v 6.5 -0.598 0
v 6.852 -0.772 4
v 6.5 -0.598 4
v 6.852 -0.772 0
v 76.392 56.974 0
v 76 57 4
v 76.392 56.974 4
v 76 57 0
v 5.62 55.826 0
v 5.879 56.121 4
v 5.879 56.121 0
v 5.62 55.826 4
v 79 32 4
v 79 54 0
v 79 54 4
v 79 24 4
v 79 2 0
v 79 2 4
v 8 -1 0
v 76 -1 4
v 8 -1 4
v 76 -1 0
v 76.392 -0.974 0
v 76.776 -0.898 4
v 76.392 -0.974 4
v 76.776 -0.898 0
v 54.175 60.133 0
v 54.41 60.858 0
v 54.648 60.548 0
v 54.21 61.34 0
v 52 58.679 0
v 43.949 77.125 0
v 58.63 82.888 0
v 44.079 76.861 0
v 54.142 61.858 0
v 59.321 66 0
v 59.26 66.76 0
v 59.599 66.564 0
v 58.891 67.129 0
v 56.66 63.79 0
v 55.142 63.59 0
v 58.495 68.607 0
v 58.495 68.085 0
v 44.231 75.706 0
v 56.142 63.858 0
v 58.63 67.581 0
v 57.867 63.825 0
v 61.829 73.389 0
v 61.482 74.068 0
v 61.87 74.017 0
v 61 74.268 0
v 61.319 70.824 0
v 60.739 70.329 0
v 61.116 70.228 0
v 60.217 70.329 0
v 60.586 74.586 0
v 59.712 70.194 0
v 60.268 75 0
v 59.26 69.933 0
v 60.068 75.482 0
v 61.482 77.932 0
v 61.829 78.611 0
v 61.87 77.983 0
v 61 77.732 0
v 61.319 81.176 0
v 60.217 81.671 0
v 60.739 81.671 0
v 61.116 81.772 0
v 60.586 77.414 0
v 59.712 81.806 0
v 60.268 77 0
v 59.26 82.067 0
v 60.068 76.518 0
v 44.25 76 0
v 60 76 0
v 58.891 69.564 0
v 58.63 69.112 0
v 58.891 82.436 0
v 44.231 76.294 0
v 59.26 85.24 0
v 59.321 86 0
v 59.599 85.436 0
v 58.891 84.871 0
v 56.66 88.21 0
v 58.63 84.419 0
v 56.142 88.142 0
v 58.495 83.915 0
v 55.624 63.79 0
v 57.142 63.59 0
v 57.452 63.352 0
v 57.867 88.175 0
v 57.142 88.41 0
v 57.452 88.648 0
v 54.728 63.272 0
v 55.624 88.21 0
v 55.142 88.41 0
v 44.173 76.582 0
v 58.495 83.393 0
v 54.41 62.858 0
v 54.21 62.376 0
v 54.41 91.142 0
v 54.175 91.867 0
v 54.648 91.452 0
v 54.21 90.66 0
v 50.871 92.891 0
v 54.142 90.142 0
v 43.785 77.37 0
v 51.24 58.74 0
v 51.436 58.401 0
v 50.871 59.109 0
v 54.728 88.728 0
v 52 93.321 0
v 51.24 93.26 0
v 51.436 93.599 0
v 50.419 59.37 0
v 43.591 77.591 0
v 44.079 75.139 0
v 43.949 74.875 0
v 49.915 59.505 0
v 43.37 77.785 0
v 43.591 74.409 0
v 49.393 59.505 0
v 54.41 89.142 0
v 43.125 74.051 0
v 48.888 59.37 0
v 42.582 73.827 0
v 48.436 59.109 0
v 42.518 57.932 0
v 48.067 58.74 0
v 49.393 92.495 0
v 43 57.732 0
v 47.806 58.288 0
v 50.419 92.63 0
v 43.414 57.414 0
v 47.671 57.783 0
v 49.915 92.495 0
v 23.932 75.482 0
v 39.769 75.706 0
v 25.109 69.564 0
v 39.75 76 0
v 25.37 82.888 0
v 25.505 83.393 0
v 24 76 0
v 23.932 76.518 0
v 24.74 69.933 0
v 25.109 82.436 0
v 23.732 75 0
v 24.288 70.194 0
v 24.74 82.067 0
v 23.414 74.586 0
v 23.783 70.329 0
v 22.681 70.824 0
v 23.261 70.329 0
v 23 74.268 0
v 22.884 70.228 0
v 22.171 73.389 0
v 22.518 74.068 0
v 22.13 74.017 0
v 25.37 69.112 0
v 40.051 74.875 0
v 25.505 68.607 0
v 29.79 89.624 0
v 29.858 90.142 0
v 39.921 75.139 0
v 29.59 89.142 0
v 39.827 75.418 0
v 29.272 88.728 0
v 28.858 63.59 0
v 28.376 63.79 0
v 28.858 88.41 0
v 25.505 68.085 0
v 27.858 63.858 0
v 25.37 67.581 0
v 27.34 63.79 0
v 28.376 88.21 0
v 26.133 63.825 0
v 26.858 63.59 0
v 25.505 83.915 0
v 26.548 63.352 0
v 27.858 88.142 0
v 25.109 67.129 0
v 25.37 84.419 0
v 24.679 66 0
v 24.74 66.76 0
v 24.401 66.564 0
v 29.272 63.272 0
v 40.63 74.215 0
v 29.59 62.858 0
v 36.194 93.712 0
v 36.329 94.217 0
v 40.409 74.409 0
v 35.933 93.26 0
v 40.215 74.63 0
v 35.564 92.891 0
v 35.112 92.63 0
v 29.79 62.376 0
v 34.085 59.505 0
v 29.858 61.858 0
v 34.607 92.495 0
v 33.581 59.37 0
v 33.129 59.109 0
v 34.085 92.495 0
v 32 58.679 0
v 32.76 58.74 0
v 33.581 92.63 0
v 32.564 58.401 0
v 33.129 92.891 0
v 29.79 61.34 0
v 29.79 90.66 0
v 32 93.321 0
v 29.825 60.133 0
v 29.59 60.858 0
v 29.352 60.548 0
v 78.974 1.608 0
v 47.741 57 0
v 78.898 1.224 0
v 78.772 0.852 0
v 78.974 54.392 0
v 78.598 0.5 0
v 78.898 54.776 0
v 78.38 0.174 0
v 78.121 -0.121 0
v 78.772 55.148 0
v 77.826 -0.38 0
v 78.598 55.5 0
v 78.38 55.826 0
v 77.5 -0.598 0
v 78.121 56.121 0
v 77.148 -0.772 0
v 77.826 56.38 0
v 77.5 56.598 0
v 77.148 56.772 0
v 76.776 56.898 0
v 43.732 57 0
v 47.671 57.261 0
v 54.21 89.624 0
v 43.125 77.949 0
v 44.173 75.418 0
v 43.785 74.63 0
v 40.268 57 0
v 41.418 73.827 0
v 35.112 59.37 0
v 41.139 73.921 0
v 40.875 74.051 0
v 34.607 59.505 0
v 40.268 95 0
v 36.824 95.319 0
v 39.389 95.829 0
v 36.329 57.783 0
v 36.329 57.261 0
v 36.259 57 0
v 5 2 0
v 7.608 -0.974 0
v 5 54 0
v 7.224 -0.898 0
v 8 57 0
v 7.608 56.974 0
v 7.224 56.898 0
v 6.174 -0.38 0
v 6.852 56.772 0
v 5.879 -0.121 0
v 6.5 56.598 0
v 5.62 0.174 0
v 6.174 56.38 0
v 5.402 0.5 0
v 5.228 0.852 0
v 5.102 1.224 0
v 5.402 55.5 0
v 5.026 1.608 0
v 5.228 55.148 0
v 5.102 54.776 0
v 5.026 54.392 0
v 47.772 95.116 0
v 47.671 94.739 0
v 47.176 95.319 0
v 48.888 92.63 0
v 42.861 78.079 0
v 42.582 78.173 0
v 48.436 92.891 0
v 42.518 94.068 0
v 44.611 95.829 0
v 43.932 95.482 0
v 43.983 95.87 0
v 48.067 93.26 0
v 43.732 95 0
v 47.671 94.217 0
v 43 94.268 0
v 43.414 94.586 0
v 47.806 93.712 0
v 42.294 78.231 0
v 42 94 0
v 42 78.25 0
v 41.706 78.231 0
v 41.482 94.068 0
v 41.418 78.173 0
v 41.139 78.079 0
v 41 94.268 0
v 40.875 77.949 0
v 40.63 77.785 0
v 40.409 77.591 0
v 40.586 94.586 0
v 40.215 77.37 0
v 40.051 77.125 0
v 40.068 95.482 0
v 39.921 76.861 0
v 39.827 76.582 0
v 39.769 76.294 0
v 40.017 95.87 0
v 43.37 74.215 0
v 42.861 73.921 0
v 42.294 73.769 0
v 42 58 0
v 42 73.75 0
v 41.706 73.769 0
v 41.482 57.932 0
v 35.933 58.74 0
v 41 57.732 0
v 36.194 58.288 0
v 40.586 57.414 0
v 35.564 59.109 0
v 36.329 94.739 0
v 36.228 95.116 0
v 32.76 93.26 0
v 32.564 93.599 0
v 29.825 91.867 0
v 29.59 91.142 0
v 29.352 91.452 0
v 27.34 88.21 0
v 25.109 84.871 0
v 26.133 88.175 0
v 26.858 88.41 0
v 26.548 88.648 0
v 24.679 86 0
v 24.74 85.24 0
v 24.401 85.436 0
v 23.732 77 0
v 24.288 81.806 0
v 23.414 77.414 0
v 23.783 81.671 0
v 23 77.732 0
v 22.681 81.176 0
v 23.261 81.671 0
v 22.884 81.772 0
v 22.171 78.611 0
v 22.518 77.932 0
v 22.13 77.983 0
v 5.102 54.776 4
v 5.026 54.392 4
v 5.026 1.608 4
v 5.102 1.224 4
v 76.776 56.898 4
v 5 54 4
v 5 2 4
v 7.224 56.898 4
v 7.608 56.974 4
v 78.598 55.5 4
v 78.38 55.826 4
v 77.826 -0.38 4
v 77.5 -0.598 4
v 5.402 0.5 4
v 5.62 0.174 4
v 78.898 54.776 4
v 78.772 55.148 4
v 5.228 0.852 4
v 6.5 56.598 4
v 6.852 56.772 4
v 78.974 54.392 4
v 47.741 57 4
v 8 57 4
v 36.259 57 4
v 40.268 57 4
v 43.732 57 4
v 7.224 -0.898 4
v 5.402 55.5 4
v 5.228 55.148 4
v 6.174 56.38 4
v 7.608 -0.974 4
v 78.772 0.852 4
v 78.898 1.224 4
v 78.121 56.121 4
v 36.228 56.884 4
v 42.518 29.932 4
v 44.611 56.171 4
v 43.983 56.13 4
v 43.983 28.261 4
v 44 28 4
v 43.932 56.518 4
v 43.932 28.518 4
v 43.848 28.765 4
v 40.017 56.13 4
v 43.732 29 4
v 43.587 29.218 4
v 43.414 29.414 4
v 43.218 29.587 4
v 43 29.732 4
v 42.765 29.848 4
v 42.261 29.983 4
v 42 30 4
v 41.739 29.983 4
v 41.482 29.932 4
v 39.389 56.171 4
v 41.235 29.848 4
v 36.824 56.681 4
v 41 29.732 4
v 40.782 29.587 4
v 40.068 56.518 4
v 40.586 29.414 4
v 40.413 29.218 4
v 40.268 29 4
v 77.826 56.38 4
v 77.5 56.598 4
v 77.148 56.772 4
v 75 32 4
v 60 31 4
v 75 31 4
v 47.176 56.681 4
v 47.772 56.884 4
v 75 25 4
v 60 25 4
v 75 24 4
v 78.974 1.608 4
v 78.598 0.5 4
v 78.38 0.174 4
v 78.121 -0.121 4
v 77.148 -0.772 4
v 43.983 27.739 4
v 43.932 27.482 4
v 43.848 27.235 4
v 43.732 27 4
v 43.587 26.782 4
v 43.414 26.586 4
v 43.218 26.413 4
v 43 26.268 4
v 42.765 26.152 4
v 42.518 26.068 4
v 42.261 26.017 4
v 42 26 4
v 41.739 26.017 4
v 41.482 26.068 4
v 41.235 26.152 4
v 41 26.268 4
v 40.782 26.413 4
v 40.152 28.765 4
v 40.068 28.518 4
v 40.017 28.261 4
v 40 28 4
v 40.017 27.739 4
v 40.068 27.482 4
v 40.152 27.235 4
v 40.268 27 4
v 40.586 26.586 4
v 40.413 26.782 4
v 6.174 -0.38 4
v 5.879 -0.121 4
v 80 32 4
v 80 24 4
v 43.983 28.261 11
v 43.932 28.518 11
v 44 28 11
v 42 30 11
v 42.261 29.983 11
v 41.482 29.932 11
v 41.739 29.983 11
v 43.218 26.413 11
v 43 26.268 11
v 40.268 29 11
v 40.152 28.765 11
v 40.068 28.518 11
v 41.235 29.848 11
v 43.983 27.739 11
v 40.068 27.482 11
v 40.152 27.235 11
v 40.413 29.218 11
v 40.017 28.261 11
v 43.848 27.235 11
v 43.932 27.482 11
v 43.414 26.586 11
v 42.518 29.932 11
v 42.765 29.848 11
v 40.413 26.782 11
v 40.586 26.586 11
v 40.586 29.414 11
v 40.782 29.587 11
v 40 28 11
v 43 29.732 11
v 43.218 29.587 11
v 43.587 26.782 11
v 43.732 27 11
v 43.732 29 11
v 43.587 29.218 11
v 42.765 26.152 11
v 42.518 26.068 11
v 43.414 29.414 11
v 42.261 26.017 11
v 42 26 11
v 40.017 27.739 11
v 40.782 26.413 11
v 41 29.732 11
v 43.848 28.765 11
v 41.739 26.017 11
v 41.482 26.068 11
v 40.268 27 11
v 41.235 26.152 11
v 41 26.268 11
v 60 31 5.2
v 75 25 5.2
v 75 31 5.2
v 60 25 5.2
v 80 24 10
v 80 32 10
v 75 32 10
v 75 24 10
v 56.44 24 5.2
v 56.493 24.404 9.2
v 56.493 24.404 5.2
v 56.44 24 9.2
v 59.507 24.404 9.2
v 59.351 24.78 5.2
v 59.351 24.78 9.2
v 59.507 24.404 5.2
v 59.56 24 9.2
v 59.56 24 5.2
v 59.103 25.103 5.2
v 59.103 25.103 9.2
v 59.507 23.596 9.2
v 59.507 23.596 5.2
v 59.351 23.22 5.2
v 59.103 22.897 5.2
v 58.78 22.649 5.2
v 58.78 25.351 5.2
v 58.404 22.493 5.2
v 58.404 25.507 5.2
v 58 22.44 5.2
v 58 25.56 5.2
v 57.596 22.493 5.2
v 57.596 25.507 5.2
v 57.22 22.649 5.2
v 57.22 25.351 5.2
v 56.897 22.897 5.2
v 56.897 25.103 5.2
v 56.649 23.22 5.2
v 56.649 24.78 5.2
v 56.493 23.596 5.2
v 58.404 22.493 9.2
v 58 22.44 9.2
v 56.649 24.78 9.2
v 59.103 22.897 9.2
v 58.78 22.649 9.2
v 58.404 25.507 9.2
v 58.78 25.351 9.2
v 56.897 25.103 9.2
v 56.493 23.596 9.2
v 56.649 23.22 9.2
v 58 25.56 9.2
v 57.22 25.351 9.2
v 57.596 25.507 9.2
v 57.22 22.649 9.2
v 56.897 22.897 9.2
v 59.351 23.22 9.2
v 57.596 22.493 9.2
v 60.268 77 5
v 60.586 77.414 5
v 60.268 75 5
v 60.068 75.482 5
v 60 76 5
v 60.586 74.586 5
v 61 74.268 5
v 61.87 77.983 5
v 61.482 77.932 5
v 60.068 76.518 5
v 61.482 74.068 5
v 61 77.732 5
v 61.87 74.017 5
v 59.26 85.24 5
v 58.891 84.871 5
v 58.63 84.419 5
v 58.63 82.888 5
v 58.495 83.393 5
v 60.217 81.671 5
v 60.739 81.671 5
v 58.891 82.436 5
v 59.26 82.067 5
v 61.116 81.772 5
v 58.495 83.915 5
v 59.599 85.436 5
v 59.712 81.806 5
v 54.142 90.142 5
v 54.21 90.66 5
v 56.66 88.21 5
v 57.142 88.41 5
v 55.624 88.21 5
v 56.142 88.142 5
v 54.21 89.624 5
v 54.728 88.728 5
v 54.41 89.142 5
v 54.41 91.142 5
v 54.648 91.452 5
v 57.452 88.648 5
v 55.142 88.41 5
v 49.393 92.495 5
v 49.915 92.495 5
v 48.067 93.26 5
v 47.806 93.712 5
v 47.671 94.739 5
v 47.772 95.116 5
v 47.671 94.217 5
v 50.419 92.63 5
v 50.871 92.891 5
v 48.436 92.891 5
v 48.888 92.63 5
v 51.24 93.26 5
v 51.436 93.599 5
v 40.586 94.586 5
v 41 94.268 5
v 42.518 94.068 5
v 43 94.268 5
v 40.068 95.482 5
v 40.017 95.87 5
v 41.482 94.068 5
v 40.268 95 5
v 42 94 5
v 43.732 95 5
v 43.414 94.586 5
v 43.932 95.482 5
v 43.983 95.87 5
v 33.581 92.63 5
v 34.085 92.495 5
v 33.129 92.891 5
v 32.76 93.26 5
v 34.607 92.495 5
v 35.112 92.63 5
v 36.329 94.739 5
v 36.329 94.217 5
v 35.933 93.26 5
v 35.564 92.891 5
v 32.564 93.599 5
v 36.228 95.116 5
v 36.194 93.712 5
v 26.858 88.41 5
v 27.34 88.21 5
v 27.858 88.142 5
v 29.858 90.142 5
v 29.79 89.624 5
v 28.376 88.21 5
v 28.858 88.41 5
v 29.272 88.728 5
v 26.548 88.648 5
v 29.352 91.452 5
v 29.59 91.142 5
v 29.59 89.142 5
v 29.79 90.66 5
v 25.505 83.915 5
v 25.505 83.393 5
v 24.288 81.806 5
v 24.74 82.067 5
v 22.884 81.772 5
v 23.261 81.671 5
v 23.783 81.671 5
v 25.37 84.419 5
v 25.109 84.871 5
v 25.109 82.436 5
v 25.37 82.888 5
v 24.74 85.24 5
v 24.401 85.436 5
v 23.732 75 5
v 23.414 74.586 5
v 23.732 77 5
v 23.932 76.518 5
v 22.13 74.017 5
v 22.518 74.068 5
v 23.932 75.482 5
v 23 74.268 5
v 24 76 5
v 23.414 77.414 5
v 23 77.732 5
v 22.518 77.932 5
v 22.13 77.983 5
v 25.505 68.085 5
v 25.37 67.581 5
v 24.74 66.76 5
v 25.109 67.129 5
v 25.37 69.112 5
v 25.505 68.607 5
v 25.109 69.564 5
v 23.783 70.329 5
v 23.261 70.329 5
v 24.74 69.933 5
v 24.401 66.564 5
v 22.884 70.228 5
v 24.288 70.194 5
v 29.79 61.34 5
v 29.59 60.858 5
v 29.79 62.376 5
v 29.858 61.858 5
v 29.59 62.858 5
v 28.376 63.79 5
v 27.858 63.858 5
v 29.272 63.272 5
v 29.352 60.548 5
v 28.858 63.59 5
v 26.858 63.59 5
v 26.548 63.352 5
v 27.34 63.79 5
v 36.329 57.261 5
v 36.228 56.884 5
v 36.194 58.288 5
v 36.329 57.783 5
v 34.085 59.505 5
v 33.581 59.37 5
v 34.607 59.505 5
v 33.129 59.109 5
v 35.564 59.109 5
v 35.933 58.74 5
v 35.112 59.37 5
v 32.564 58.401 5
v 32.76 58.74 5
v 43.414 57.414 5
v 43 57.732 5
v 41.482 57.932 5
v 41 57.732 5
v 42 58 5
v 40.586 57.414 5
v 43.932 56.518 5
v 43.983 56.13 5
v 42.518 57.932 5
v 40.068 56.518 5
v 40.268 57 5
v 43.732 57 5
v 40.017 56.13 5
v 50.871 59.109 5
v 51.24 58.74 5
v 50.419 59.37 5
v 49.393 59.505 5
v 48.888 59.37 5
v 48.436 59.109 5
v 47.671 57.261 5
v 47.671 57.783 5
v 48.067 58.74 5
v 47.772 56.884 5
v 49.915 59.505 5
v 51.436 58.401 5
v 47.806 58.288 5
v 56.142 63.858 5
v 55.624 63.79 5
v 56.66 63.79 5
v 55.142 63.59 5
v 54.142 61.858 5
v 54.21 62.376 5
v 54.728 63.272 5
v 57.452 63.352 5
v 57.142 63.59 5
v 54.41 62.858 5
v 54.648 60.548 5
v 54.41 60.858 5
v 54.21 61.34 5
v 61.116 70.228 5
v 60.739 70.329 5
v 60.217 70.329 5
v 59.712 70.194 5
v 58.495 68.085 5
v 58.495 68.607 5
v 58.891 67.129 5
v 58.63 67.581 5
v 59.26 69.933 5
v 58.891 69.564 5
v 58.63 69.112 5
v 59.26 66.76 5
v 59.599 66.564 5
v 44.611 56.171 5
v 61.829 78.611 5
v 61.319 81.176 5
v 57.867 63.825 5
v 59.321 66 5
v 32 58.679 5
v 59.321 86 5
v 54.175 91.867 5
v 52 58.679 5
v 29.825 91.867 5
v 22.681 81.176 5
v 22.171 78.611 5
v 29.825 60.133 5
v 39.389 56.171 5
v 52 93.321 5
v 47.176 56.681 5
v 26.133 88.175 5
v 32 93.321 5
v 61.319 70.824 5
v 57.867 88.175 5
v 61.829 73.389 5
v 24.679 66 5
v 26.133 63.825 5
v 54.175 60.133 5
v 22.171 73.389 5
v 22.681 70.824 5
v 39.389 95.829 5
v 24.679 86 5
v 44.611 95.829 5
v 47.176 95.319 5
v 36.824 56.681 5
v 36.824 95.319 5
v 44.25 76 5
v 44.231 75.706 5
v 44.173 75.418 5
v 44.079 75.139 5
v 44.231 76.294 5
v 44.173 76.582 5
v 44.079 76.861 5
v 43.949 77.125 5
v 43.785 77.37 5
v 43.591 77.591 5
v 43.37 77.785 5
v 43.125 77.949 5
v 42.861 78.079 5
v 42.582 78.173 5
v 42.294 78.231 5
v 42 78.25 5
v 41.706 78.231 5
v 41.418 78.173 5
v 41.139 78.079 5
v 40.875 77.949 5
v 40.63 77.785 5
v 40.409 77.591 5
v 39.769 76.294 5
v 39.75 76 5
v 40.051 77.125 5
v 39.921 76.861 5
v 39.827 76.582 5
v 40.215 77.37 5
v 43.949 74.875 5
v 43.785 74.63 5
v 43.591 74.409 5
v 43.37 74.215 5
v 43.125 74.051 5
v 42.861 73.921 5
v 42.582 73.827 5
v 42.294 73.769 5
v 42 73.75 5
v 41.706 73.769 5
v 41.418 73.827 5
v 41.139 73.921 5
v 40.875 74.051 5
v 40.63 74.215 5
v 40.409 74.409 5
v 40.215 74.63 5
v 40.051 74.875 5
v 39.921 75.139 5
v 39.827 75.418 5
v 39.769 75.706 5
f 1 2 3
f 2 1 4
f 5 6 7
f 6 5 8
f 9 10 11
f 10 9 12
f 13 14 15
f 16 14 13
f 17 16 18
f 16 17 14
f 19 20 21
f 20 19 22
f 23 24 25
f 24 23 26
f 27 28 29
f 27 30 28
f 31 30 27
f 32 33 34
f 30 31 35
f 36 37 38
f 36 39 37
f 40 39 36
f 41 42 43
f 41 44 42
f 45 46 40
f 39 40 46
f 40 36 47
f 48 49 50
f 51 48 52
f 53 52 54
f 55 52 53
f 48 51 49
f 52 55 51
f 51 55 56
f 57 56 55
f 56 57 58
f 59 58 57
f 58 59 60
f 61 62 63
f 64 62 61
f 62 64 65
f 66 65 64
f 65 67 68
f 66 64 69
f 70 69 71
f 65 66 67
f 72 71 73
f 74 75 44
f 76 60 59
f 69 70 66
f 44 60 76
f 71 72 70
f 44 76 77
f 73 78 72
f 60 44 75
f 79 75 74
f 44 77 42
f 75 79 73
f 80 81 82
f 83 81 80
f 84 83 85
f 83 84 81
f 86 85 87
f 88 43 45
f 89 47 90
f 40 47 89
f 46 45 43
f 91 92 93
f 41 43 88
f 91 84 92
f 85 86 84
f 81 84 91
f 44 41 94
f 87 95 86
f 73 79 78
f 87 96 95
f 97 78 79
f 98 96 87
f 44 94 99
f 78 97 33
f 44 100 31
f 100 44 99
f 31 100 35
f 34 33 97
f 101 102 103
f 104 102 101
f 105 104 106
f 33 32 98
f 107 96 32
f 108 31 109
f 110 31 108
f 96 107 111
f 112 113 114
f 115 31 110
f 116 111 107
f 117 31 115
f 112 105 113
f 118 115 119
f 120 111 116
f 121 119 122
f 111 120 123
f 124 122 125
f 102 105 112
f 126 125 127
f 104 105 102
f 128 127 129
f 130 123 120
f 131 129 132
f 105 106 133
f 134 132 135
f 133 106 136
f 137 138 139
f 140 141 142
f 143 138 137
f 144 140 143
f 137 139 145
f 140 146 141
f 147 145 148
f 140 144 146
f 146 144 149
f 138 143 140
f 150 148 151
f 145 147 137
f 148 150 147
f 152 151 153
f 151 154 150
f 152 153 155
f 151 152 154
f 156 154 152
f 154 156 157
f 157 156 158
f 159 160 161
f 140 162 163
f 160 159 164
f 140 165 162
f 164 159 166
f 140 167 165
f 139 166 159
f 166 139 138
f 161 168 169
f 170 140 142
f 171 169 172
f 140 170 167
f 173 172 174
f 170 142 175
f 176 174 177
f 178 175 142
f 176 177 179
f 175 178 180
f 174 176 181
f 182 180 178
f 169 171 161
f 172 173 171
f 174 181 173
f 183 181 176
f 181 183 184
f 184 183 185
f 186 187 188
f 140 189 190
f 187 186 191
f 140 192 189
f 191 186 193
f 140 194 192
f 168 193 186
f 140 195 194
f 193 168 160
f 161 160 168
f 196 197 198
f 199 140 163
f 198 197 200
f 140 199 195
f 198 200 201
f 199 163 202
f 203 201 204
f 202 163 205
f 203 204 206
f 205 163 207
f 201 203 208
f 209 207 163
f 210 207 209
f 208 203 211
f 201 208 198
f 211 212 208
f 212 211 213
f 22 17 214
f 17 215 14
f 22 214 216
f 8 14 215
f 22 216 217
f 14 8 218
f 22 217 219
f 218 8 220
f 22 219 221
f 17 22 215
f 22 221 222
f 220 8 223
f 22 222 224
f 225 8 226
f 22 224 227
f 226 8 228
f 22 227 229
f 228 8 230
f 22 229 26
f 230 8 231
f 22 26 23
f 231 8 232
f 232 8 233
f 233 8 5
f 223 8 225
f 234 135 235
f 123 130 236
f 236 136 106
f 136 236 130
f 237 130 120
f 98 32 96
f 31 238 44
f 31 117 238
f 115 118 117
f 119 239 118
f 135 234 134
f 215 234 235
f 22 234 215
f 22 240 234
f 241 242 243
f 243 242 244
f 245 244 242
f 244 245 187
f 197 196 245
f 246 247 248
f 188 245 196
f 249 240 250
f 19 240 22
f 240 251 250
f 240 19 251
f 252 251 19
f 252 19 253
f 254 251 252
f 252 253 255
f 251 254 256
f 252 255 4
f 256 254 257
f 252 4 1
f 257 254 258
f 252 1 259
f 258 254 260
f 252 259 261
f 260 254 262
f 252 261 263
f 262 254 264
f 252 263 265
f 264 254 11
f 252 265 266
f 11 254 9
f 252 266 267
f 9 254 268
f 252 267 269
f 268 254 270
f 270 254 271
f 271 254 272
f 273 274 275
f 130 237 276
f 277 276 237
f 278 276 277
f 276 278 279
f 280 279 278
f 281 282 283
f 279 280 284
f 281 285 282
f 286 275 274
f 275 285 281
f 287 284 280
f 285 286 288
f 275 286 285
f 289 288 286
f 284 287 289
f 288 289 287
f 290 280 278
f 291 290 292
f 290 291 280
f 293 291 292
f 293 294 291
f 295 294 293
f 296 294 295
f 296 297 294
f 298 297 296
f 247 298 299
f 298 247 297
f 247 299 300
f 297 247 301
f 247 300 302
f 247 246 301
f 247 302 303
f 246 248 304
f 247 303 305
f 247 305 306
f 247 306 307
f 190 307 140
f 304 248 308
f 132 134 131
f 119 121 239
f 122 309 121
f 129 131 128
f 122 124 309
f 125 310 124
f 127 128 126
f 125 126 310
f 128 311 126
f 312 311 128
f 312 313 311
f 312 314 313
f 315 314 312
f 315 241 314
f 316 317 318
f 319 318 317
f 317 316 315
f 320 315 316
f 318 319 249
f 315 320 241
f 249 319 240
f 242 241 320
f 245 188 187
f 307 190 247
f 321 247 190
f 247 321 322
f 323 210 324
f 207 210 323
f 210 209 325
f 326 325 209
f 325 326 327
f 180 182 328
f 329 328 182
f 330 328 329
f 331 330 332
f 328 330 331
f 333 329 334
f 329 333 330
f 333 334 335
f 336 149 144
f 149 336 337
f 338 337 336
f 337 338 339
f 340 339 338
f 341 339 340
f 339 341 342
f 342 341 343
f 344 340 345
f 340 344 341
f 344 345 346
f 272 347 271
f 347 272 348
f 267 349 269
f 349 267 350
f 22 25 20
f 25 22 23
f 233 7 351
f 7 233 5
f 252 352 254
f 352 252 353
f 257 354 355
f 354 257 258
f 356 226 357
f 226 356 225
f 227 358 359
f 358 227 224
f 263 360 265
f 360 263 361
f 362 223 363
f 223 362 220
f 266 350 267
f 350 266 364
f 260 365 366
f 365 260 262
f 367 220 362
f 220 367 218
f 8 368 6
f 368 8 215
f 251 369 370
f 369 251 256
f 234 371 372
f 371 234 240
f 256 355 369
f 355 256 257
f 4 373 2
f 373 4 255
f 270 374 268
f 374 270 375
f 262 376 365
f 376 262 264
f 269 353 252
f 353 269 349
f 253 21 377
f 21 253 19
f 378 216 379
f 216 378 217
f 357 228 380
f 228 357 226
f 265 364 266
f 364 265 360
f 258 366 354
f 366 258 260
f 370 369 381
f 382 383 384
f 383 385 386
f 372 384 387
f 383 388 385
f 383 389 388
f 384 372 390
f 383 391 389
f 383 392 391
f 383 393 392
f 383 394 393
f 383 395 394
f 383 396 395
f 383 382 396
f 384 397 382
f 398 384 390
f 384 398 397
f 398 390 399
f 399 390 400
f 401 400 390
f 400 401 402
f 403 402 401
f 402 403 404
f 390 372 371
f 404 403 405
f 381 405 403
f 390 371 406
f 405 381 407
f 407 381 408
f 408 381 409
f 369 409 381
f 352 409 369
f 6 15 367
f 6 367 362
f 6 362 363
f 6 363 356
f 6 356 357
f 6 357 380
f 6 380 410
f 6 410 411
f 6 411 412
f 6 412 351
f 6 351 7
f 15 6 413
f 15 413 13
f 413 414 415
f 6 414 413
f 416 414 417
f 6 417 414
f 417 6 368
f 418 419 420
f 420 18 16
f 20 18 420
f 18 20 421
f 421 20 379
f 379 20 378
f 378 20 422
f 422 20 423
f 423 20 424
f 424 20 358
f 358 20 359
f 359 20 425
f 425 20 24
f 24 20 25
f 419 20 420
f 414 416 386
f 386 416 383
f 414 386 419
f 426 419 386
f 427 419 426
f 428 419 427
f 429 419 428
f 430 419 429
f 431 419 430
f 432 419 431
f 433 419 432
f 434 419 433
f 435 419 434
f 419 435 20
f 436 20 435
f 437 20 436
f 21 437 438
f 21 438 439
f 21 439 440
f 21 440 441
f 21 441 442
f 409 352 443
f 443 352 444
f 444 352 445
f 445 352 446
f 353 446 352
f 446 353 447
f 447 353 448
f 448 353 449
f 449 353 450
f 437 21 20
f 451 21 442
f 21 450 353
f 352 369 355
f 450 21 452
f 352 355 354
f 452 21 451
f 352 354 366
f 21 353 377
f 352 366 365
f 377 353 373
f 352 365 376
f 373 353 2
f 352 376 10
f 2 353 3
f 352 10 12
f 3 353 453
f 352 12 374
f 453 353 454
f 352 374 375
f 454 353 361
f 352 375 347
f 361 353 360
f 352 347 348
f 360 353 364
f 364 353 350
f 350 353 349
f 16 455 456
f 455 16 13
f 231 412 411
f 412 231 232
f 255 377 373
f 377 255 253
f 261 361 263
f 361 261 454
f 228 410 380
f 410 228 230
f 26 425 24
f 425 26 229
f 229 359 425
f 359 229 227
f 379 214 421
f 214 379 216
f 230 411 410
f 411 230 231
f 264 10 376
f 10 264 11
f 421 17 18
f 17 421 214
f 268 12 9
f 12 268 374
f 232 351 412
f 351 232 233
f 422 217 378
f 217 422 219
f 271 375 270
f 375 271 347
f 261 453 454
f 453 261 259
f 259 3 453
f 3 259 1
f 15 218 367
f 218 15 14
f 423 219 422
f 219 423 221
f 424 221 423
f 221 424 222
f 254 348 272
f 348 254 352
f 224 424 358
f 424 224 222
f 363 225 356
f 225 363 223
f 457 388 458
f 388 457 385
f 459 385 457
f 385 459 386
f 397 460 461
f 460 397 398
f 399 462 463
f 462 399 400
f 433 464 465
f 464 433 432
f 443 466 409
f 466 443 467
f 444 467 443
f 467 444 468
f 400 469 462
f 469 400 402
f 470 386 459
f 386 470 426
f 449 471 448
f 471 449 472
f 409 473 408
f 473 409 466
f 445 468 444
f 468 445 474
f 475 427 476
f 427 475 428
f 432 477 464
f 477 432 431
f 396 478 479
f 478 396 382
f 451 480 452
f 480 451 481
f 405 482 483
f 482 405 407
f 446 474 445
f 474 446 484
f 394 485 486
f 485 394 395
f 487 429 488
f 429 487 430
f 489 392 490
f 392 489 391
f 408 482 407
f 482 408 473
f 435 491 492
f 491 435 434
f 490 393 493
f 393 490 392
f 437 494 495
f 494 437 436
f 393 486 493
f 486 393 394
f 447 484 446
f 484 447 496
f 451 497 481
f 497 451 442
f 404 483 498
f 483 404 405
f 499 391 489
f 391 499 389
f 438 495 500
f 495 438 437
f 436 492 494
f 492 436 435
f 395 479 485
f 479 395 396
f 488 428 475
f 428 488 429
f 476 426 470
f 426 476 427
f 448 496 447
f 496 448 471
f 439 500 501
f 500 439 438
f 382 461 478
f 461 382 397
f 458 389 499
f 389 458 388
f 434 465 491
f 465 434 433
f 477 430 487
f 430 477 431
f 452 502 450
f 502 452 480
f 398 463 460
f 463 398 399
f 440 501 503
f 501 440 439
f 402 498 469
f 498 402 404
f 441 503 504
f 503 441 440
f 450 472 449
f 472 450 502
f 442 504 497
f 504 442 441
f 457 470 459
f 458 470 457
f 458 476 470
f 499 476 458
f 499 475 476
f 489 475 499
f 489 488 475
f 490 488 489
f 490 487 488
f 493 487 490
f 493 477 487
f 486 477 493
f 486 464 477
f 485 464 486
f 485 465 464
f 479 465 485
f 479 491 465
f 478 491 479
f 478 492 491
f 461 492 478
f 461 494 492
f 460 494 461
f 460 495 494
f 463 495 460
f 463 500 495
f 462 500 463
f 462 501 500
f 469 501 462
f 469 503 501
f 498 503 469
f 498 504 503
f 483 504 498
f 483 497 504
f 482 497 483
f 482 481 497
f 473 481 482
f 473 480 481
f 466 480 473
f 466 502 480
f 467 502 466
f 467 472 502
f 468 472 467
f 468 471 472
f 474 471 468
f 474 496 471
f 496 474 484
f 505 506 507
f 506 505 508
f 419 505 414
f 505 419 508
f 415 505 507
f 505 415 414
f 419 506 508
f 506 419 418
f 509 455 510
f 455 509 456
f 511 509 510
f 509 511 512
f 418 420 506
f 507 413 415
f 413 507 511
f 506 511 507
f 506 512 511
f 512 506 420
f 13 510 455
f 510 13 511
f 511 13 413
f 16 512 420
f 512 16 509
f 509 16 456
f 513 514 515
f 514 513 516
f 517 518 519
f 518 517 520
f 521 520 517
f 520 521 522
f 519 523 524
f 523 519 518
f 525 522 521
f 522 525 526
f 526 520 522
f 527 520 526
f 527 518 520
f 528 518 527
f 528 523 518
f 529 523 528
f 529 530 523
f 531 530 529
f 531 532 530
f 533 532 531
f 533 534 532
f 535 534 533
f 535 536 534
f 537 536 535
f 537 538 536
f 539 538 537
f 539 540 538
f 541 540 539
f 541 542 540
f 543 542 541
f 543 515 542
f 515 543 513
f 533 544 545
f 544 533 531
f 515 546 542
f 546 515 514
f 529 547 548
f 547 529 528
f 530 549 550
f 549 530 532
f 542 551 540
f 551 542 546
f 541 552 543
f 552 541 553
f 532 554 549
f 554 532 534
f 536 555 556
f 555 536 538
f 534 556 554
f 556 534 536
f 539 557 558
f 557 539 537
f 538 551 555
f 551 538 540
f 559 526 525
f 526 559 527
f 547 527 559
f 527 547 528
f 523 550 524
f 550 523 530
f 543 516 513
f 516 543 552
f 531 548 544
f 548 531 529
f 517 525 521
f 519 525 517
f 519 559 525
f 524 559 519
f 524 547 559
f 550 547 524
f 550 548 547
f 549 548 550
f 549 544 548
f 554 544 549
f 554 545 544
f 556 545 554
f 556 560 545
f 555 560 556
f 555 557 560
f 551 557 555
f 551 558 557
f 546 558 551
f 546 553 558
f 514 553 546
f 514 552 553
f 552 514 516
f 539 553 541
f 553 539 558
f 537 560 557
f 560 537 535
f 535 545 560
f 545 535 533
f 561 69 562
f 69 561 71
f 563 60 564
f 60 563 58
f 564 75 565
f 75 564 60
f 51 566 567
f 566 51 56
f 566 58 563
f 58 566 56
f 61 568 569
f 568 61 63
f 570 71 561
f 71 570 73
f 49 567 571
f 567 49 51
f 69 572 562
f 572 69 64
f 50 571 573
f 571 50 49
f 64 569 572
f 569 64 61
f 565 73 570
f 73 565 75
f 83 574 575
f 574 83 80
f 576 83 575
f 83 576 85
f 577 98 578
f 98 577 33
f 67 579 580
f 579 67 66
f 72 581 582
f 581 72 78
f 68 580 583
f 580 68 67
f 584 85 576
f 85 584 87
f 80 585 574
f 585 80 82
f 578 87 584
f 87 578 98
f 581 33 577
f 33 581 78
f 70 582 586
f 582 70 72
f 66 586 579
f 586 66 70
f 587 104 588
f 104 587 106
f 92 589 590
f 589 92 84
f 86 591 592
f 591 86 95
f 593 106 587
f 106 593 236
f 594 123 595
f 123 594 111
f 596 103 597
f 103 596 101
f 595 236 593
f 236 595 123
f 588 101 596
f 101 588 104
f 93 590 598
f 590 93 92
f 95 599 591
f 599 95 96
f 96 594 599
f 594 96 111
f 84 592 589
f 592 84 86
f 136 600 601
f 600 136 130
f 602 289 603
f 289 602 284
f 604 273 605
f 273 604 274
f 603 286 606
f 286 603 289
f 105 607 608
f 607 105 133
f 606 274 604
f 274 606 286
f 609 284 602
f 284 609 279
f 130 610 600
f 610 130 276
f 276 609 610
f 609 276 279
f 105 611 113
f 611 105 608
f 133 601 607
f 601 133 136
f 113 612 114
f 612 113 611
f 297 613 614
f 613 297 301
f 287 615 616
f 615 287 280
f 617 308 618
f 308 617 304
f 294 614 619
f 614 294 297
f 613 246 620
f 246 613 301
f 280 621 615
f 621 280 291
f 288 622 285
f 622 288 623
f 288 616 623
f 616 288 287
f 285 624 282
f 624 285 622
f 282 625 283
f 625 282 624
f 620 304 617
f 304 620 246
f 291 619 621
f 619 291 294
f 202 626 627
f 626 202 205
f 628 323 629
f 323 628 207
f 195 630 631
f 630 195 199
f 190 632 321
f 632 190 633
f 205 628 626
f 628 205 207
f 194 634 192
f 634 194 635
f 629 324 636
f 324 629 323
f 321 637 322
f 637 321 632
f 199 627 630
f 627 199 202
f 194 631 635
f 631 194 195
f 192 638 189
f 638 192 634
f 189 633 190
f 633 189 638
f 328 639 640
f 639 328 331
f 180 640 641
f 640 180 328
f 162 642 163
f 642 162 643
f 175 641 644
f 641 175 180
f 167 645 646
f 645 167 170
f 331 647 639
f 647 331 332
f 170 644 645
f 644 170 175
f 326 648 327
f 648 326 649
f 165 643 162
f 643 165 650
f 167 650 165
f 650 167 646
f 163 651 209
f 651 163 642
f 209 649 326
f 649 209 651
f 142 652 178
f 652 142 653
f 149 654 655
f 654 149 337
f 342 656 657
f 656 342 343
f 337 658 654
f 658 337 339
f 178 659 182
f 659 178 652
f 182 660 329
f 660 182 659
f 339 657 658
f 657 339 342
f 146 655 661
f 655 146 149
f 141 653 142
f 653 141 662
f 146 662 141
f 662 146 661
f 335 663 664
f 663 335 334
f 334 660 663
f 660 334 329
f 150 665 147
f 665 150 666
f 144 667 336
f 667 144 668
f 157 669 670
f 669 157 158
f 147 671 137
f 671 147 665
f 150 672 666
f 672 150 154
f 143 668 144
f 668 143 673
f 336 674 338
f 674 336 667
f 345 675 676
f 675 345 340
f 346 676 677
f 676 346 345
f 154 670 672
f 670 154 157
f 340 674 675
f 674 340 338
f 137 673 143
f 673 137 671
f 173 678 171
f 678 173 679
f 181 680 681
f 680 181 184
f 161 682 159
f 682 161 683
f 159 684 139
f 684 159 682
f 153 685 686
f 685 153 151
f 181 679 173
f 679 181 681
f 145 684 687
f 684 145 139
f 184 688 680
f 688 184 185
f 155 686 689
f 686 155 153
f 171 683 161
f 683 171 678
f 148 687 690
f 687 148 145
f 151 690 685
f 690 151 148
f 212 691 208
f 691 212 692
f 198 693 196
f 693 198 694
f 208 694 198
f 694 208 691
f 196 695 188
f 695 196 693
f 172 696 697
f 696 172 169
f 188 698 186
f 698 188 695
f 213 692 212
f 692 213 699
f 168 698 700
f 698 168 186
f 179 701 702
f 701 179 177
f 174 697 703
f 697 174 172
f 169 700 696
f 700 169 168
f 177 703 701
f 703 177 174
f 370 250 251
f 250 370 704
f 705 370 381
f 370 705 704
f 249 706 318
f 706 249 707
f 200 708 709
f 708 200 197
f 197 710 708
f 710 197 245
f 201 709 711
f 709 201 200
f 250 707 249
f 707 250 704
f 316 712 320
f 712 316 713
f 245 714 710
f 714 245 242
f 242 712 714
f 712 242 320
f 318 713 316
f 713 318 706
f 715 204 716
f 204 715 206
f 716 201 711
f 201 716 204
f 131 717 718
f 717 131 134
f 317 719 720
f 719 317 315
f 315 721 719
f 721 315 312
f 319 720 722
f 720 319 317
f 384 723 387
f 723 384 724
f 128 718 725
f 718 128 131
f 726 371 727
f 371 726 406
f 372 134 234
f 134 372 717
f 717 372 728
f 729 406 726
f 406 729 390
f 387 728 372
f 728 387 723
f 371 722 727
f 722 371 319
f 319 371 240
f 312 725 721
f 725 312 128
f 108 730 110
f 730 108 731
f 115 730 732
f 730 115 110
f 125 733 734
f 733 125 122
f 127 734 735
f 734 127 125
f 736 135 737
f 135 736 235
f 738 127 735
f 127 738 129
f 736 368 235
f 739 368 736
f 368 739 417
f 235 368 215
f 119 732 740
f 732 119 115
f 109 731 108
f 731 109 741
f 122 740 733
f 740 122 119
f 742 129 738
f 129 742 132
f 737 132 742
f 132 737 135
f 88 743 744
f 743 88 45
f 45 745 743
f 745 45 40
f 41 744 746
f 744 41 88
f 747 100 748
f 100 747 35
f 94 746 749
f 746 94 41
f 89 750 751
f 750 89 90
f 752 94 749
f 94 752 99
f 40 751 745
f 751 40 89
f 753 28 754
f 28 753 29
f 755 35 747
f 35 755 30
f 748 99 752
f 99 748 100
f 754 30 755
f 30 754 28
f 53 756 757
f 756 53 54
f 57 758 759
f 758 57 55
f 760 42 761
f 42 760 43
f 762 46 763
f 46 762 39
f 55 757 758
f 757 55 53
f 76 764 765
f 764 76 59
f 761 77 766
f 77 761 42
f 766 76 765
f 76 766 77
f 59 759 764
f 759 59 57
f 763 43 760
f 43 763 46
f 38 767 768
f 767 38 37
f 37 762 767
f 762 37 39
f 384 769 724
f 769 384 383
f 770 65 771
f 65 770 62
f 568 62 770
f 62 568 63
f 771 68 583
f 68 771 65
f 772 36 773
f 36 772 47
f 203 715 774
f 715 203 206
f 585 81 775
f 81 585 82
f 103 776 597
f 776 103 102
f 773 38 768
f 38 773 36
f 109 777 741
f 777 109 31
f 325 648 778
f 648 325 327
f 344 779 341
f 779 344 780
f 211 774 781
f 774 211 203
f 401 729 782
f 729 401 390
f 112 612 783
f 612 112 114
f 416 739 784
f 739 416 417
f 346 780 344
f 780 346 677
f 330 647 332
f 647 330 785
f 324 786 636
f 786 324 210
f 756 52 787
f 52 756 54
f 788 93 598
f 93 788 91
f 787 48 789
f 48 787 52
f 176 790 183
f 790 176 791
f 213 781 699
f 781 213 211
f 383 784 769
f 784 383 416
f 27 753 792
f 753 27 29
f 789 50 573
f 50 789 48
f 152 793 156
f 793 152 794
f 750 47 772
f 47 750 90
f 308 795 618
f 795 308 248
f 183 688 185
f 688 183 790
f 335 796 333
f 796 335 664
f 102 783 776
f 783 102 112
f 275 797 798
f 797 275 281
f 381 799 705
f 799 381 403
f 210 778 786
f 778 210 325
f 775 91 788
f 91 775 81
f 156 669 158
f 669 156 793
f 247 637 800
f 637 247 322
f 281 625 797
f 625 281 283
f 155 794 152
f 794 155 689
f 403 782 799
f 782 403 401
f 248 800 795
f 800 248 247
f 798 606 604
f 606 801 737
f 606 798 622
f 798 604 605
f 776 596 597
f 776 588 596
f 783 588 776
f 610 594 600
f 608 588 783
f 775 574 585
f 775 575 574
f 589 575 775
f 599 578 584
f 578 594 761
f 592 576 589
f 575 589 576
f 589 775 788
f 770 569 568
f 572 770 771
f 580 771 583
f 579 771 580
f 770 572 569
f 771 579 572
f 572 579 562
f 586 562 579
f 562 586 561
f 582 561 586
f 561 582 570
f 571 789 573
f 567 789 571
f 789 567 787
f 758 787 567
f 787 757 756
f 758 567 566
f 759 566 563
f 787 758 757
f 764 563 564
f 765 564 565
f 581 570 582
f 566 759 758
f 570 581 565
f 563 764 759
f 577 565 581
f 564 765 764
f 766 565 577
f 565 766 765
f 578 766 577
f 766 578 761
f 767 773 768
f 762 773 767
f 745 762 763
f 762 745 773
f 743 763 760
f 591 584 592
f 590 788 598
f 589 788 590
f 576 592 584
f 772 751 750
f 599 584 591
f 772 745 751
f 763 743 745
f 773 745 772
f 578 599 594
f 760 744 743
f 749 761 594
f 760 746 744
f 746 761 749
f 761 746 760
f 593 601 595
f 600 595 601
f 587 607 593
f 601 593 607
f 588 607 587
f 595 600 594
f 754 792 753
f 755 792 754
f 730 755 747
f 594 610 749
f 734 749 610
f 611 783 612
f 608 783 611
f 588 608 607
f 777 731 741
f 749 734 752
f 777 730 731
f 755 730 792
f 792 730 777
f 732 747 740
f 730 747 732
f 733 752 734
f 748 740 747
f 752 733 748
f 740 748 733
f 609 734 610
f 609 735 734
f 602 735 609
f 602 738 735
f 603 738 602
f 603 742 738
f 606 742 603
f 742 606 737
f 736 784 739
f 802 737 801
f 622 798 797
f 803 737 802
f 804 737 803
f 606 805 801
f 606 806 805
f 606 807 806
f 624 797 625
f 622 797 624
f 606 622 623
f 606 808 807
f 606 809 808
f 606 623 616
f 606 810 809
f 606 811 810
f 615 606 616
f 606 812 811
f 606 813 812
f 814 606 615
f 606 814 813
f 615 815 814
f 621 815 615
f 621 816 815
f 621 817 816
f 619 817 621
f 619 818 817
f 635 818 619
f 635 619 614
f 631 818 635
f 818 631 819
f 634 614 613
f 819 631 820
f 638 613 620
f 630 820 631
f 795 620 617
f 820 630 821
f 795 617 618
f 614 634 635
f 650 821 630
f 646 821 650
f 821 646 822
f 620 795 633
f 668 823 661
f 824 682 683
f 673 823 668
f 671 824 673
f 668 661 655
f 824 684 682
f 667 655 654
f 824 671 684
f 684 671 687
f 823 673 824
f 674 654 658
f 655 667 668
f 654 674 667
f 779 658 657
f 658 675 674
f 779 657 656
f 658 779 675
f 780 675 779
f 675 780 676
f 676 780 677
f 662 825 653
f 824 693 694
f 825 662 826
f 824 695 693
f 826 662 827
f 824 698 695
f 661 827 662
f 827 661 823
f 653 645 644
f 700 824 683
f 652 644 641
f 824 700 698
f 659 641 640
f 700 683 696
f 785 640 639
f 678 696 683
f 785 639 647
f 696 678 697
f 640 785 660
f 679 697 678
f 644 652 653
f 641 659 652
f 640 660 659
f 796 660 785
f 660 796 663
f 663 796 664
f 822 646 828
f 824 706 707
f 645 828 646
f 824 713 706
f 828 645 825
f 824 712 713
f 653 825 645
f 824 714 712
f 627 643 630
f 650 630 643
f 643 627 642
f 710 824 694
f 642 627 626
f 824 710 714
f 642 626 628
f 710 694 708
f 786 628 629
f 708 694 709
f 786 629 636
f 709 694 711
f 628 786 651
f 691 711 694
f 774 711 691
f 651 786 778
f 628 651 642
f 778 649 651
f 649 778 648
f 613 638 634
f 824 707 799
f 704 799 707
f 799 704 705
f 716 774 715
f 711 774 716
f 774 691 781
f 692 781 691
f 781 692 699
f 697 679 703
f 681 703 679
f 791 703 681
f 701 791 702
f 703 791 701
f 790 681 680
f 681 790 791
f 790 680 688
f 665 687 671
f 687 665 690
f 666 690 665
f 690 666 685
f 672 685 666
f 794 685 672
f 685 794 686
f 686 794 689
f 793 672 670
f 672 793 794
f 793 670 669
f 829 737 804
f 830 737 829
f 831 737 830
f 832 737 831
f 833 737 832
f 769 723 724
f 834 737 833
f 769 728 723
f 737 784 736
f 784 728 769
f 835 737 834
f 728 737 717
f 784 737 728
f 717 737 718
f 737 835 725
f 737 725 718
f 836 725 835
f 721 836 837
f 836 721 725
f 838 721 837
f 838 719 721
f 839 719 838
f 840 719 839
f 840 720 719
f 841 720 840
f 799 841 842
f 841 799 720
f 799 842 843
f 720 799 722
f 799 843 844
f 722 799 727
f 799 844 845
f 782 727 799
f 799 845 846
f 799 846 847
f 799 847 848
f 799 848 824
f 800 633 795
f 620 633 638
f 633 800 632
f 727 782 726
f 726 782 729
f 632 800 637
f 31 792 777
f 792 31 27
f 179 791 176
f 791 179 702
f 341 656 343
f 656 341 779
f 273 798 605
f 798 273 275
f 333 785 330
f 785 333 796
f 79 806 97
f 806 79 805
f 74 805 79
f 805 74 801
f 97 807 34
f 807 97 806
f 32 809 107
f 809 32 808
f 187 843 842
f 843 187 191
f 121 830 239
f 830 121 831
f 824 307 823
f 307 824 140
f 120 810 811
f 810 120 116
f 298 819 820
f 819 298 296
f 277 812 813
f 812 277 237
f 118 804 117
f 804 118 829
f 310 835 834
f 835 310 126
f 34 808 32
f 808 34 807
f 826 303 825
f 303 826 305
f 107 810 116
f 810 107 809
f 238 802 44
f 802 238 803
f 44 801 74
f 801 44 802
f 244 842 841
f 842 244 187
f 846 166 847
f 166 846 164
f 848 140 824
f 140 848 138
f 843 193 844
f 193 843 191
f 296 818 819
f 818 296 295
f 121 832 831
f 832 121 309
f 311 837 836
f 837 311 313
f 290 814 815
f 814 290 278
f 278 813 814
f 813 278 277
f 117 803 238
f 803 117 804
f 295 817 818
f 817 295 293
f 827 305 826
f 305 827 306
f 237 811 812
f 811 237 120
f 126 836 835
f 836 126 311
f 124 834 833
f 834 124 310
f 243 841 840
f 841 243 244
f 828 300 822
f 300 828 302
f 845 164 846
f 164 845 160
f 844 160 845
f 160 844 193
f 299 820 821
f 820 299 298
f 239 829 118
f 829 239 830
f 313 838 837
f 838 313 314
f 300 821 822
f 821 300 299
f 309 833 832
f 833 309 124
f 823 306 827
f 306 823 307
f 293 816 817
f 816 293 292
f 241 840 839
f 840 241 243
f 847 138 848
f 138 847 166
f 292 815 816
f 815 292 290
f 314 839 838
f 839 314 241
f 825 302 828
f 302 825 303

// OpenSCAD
/*
Sample 107: Dreh-Rastindexierung — 16 Positionen
Generated from the FDM Mechanical Sample Library.
Units: millimetres.

Override examples:
  openscad -o custom.stl -D 'view="plate"' -D 'render_fn=64' model.scad
  openscad -o preview.png -D 'view="assembly"' model.scad
*/
use <../../../library/fdm_mechanisms.scad>

render_fn = is_undef(render_fn) ? 48 : render_fn;
view = is_undef(view) ? "plate" : view;
$fn = render_fn;

sample_detent_indexer(
    view=view,
    notches=16,
    beam_t=1.2,
    clearance=0.25
);
